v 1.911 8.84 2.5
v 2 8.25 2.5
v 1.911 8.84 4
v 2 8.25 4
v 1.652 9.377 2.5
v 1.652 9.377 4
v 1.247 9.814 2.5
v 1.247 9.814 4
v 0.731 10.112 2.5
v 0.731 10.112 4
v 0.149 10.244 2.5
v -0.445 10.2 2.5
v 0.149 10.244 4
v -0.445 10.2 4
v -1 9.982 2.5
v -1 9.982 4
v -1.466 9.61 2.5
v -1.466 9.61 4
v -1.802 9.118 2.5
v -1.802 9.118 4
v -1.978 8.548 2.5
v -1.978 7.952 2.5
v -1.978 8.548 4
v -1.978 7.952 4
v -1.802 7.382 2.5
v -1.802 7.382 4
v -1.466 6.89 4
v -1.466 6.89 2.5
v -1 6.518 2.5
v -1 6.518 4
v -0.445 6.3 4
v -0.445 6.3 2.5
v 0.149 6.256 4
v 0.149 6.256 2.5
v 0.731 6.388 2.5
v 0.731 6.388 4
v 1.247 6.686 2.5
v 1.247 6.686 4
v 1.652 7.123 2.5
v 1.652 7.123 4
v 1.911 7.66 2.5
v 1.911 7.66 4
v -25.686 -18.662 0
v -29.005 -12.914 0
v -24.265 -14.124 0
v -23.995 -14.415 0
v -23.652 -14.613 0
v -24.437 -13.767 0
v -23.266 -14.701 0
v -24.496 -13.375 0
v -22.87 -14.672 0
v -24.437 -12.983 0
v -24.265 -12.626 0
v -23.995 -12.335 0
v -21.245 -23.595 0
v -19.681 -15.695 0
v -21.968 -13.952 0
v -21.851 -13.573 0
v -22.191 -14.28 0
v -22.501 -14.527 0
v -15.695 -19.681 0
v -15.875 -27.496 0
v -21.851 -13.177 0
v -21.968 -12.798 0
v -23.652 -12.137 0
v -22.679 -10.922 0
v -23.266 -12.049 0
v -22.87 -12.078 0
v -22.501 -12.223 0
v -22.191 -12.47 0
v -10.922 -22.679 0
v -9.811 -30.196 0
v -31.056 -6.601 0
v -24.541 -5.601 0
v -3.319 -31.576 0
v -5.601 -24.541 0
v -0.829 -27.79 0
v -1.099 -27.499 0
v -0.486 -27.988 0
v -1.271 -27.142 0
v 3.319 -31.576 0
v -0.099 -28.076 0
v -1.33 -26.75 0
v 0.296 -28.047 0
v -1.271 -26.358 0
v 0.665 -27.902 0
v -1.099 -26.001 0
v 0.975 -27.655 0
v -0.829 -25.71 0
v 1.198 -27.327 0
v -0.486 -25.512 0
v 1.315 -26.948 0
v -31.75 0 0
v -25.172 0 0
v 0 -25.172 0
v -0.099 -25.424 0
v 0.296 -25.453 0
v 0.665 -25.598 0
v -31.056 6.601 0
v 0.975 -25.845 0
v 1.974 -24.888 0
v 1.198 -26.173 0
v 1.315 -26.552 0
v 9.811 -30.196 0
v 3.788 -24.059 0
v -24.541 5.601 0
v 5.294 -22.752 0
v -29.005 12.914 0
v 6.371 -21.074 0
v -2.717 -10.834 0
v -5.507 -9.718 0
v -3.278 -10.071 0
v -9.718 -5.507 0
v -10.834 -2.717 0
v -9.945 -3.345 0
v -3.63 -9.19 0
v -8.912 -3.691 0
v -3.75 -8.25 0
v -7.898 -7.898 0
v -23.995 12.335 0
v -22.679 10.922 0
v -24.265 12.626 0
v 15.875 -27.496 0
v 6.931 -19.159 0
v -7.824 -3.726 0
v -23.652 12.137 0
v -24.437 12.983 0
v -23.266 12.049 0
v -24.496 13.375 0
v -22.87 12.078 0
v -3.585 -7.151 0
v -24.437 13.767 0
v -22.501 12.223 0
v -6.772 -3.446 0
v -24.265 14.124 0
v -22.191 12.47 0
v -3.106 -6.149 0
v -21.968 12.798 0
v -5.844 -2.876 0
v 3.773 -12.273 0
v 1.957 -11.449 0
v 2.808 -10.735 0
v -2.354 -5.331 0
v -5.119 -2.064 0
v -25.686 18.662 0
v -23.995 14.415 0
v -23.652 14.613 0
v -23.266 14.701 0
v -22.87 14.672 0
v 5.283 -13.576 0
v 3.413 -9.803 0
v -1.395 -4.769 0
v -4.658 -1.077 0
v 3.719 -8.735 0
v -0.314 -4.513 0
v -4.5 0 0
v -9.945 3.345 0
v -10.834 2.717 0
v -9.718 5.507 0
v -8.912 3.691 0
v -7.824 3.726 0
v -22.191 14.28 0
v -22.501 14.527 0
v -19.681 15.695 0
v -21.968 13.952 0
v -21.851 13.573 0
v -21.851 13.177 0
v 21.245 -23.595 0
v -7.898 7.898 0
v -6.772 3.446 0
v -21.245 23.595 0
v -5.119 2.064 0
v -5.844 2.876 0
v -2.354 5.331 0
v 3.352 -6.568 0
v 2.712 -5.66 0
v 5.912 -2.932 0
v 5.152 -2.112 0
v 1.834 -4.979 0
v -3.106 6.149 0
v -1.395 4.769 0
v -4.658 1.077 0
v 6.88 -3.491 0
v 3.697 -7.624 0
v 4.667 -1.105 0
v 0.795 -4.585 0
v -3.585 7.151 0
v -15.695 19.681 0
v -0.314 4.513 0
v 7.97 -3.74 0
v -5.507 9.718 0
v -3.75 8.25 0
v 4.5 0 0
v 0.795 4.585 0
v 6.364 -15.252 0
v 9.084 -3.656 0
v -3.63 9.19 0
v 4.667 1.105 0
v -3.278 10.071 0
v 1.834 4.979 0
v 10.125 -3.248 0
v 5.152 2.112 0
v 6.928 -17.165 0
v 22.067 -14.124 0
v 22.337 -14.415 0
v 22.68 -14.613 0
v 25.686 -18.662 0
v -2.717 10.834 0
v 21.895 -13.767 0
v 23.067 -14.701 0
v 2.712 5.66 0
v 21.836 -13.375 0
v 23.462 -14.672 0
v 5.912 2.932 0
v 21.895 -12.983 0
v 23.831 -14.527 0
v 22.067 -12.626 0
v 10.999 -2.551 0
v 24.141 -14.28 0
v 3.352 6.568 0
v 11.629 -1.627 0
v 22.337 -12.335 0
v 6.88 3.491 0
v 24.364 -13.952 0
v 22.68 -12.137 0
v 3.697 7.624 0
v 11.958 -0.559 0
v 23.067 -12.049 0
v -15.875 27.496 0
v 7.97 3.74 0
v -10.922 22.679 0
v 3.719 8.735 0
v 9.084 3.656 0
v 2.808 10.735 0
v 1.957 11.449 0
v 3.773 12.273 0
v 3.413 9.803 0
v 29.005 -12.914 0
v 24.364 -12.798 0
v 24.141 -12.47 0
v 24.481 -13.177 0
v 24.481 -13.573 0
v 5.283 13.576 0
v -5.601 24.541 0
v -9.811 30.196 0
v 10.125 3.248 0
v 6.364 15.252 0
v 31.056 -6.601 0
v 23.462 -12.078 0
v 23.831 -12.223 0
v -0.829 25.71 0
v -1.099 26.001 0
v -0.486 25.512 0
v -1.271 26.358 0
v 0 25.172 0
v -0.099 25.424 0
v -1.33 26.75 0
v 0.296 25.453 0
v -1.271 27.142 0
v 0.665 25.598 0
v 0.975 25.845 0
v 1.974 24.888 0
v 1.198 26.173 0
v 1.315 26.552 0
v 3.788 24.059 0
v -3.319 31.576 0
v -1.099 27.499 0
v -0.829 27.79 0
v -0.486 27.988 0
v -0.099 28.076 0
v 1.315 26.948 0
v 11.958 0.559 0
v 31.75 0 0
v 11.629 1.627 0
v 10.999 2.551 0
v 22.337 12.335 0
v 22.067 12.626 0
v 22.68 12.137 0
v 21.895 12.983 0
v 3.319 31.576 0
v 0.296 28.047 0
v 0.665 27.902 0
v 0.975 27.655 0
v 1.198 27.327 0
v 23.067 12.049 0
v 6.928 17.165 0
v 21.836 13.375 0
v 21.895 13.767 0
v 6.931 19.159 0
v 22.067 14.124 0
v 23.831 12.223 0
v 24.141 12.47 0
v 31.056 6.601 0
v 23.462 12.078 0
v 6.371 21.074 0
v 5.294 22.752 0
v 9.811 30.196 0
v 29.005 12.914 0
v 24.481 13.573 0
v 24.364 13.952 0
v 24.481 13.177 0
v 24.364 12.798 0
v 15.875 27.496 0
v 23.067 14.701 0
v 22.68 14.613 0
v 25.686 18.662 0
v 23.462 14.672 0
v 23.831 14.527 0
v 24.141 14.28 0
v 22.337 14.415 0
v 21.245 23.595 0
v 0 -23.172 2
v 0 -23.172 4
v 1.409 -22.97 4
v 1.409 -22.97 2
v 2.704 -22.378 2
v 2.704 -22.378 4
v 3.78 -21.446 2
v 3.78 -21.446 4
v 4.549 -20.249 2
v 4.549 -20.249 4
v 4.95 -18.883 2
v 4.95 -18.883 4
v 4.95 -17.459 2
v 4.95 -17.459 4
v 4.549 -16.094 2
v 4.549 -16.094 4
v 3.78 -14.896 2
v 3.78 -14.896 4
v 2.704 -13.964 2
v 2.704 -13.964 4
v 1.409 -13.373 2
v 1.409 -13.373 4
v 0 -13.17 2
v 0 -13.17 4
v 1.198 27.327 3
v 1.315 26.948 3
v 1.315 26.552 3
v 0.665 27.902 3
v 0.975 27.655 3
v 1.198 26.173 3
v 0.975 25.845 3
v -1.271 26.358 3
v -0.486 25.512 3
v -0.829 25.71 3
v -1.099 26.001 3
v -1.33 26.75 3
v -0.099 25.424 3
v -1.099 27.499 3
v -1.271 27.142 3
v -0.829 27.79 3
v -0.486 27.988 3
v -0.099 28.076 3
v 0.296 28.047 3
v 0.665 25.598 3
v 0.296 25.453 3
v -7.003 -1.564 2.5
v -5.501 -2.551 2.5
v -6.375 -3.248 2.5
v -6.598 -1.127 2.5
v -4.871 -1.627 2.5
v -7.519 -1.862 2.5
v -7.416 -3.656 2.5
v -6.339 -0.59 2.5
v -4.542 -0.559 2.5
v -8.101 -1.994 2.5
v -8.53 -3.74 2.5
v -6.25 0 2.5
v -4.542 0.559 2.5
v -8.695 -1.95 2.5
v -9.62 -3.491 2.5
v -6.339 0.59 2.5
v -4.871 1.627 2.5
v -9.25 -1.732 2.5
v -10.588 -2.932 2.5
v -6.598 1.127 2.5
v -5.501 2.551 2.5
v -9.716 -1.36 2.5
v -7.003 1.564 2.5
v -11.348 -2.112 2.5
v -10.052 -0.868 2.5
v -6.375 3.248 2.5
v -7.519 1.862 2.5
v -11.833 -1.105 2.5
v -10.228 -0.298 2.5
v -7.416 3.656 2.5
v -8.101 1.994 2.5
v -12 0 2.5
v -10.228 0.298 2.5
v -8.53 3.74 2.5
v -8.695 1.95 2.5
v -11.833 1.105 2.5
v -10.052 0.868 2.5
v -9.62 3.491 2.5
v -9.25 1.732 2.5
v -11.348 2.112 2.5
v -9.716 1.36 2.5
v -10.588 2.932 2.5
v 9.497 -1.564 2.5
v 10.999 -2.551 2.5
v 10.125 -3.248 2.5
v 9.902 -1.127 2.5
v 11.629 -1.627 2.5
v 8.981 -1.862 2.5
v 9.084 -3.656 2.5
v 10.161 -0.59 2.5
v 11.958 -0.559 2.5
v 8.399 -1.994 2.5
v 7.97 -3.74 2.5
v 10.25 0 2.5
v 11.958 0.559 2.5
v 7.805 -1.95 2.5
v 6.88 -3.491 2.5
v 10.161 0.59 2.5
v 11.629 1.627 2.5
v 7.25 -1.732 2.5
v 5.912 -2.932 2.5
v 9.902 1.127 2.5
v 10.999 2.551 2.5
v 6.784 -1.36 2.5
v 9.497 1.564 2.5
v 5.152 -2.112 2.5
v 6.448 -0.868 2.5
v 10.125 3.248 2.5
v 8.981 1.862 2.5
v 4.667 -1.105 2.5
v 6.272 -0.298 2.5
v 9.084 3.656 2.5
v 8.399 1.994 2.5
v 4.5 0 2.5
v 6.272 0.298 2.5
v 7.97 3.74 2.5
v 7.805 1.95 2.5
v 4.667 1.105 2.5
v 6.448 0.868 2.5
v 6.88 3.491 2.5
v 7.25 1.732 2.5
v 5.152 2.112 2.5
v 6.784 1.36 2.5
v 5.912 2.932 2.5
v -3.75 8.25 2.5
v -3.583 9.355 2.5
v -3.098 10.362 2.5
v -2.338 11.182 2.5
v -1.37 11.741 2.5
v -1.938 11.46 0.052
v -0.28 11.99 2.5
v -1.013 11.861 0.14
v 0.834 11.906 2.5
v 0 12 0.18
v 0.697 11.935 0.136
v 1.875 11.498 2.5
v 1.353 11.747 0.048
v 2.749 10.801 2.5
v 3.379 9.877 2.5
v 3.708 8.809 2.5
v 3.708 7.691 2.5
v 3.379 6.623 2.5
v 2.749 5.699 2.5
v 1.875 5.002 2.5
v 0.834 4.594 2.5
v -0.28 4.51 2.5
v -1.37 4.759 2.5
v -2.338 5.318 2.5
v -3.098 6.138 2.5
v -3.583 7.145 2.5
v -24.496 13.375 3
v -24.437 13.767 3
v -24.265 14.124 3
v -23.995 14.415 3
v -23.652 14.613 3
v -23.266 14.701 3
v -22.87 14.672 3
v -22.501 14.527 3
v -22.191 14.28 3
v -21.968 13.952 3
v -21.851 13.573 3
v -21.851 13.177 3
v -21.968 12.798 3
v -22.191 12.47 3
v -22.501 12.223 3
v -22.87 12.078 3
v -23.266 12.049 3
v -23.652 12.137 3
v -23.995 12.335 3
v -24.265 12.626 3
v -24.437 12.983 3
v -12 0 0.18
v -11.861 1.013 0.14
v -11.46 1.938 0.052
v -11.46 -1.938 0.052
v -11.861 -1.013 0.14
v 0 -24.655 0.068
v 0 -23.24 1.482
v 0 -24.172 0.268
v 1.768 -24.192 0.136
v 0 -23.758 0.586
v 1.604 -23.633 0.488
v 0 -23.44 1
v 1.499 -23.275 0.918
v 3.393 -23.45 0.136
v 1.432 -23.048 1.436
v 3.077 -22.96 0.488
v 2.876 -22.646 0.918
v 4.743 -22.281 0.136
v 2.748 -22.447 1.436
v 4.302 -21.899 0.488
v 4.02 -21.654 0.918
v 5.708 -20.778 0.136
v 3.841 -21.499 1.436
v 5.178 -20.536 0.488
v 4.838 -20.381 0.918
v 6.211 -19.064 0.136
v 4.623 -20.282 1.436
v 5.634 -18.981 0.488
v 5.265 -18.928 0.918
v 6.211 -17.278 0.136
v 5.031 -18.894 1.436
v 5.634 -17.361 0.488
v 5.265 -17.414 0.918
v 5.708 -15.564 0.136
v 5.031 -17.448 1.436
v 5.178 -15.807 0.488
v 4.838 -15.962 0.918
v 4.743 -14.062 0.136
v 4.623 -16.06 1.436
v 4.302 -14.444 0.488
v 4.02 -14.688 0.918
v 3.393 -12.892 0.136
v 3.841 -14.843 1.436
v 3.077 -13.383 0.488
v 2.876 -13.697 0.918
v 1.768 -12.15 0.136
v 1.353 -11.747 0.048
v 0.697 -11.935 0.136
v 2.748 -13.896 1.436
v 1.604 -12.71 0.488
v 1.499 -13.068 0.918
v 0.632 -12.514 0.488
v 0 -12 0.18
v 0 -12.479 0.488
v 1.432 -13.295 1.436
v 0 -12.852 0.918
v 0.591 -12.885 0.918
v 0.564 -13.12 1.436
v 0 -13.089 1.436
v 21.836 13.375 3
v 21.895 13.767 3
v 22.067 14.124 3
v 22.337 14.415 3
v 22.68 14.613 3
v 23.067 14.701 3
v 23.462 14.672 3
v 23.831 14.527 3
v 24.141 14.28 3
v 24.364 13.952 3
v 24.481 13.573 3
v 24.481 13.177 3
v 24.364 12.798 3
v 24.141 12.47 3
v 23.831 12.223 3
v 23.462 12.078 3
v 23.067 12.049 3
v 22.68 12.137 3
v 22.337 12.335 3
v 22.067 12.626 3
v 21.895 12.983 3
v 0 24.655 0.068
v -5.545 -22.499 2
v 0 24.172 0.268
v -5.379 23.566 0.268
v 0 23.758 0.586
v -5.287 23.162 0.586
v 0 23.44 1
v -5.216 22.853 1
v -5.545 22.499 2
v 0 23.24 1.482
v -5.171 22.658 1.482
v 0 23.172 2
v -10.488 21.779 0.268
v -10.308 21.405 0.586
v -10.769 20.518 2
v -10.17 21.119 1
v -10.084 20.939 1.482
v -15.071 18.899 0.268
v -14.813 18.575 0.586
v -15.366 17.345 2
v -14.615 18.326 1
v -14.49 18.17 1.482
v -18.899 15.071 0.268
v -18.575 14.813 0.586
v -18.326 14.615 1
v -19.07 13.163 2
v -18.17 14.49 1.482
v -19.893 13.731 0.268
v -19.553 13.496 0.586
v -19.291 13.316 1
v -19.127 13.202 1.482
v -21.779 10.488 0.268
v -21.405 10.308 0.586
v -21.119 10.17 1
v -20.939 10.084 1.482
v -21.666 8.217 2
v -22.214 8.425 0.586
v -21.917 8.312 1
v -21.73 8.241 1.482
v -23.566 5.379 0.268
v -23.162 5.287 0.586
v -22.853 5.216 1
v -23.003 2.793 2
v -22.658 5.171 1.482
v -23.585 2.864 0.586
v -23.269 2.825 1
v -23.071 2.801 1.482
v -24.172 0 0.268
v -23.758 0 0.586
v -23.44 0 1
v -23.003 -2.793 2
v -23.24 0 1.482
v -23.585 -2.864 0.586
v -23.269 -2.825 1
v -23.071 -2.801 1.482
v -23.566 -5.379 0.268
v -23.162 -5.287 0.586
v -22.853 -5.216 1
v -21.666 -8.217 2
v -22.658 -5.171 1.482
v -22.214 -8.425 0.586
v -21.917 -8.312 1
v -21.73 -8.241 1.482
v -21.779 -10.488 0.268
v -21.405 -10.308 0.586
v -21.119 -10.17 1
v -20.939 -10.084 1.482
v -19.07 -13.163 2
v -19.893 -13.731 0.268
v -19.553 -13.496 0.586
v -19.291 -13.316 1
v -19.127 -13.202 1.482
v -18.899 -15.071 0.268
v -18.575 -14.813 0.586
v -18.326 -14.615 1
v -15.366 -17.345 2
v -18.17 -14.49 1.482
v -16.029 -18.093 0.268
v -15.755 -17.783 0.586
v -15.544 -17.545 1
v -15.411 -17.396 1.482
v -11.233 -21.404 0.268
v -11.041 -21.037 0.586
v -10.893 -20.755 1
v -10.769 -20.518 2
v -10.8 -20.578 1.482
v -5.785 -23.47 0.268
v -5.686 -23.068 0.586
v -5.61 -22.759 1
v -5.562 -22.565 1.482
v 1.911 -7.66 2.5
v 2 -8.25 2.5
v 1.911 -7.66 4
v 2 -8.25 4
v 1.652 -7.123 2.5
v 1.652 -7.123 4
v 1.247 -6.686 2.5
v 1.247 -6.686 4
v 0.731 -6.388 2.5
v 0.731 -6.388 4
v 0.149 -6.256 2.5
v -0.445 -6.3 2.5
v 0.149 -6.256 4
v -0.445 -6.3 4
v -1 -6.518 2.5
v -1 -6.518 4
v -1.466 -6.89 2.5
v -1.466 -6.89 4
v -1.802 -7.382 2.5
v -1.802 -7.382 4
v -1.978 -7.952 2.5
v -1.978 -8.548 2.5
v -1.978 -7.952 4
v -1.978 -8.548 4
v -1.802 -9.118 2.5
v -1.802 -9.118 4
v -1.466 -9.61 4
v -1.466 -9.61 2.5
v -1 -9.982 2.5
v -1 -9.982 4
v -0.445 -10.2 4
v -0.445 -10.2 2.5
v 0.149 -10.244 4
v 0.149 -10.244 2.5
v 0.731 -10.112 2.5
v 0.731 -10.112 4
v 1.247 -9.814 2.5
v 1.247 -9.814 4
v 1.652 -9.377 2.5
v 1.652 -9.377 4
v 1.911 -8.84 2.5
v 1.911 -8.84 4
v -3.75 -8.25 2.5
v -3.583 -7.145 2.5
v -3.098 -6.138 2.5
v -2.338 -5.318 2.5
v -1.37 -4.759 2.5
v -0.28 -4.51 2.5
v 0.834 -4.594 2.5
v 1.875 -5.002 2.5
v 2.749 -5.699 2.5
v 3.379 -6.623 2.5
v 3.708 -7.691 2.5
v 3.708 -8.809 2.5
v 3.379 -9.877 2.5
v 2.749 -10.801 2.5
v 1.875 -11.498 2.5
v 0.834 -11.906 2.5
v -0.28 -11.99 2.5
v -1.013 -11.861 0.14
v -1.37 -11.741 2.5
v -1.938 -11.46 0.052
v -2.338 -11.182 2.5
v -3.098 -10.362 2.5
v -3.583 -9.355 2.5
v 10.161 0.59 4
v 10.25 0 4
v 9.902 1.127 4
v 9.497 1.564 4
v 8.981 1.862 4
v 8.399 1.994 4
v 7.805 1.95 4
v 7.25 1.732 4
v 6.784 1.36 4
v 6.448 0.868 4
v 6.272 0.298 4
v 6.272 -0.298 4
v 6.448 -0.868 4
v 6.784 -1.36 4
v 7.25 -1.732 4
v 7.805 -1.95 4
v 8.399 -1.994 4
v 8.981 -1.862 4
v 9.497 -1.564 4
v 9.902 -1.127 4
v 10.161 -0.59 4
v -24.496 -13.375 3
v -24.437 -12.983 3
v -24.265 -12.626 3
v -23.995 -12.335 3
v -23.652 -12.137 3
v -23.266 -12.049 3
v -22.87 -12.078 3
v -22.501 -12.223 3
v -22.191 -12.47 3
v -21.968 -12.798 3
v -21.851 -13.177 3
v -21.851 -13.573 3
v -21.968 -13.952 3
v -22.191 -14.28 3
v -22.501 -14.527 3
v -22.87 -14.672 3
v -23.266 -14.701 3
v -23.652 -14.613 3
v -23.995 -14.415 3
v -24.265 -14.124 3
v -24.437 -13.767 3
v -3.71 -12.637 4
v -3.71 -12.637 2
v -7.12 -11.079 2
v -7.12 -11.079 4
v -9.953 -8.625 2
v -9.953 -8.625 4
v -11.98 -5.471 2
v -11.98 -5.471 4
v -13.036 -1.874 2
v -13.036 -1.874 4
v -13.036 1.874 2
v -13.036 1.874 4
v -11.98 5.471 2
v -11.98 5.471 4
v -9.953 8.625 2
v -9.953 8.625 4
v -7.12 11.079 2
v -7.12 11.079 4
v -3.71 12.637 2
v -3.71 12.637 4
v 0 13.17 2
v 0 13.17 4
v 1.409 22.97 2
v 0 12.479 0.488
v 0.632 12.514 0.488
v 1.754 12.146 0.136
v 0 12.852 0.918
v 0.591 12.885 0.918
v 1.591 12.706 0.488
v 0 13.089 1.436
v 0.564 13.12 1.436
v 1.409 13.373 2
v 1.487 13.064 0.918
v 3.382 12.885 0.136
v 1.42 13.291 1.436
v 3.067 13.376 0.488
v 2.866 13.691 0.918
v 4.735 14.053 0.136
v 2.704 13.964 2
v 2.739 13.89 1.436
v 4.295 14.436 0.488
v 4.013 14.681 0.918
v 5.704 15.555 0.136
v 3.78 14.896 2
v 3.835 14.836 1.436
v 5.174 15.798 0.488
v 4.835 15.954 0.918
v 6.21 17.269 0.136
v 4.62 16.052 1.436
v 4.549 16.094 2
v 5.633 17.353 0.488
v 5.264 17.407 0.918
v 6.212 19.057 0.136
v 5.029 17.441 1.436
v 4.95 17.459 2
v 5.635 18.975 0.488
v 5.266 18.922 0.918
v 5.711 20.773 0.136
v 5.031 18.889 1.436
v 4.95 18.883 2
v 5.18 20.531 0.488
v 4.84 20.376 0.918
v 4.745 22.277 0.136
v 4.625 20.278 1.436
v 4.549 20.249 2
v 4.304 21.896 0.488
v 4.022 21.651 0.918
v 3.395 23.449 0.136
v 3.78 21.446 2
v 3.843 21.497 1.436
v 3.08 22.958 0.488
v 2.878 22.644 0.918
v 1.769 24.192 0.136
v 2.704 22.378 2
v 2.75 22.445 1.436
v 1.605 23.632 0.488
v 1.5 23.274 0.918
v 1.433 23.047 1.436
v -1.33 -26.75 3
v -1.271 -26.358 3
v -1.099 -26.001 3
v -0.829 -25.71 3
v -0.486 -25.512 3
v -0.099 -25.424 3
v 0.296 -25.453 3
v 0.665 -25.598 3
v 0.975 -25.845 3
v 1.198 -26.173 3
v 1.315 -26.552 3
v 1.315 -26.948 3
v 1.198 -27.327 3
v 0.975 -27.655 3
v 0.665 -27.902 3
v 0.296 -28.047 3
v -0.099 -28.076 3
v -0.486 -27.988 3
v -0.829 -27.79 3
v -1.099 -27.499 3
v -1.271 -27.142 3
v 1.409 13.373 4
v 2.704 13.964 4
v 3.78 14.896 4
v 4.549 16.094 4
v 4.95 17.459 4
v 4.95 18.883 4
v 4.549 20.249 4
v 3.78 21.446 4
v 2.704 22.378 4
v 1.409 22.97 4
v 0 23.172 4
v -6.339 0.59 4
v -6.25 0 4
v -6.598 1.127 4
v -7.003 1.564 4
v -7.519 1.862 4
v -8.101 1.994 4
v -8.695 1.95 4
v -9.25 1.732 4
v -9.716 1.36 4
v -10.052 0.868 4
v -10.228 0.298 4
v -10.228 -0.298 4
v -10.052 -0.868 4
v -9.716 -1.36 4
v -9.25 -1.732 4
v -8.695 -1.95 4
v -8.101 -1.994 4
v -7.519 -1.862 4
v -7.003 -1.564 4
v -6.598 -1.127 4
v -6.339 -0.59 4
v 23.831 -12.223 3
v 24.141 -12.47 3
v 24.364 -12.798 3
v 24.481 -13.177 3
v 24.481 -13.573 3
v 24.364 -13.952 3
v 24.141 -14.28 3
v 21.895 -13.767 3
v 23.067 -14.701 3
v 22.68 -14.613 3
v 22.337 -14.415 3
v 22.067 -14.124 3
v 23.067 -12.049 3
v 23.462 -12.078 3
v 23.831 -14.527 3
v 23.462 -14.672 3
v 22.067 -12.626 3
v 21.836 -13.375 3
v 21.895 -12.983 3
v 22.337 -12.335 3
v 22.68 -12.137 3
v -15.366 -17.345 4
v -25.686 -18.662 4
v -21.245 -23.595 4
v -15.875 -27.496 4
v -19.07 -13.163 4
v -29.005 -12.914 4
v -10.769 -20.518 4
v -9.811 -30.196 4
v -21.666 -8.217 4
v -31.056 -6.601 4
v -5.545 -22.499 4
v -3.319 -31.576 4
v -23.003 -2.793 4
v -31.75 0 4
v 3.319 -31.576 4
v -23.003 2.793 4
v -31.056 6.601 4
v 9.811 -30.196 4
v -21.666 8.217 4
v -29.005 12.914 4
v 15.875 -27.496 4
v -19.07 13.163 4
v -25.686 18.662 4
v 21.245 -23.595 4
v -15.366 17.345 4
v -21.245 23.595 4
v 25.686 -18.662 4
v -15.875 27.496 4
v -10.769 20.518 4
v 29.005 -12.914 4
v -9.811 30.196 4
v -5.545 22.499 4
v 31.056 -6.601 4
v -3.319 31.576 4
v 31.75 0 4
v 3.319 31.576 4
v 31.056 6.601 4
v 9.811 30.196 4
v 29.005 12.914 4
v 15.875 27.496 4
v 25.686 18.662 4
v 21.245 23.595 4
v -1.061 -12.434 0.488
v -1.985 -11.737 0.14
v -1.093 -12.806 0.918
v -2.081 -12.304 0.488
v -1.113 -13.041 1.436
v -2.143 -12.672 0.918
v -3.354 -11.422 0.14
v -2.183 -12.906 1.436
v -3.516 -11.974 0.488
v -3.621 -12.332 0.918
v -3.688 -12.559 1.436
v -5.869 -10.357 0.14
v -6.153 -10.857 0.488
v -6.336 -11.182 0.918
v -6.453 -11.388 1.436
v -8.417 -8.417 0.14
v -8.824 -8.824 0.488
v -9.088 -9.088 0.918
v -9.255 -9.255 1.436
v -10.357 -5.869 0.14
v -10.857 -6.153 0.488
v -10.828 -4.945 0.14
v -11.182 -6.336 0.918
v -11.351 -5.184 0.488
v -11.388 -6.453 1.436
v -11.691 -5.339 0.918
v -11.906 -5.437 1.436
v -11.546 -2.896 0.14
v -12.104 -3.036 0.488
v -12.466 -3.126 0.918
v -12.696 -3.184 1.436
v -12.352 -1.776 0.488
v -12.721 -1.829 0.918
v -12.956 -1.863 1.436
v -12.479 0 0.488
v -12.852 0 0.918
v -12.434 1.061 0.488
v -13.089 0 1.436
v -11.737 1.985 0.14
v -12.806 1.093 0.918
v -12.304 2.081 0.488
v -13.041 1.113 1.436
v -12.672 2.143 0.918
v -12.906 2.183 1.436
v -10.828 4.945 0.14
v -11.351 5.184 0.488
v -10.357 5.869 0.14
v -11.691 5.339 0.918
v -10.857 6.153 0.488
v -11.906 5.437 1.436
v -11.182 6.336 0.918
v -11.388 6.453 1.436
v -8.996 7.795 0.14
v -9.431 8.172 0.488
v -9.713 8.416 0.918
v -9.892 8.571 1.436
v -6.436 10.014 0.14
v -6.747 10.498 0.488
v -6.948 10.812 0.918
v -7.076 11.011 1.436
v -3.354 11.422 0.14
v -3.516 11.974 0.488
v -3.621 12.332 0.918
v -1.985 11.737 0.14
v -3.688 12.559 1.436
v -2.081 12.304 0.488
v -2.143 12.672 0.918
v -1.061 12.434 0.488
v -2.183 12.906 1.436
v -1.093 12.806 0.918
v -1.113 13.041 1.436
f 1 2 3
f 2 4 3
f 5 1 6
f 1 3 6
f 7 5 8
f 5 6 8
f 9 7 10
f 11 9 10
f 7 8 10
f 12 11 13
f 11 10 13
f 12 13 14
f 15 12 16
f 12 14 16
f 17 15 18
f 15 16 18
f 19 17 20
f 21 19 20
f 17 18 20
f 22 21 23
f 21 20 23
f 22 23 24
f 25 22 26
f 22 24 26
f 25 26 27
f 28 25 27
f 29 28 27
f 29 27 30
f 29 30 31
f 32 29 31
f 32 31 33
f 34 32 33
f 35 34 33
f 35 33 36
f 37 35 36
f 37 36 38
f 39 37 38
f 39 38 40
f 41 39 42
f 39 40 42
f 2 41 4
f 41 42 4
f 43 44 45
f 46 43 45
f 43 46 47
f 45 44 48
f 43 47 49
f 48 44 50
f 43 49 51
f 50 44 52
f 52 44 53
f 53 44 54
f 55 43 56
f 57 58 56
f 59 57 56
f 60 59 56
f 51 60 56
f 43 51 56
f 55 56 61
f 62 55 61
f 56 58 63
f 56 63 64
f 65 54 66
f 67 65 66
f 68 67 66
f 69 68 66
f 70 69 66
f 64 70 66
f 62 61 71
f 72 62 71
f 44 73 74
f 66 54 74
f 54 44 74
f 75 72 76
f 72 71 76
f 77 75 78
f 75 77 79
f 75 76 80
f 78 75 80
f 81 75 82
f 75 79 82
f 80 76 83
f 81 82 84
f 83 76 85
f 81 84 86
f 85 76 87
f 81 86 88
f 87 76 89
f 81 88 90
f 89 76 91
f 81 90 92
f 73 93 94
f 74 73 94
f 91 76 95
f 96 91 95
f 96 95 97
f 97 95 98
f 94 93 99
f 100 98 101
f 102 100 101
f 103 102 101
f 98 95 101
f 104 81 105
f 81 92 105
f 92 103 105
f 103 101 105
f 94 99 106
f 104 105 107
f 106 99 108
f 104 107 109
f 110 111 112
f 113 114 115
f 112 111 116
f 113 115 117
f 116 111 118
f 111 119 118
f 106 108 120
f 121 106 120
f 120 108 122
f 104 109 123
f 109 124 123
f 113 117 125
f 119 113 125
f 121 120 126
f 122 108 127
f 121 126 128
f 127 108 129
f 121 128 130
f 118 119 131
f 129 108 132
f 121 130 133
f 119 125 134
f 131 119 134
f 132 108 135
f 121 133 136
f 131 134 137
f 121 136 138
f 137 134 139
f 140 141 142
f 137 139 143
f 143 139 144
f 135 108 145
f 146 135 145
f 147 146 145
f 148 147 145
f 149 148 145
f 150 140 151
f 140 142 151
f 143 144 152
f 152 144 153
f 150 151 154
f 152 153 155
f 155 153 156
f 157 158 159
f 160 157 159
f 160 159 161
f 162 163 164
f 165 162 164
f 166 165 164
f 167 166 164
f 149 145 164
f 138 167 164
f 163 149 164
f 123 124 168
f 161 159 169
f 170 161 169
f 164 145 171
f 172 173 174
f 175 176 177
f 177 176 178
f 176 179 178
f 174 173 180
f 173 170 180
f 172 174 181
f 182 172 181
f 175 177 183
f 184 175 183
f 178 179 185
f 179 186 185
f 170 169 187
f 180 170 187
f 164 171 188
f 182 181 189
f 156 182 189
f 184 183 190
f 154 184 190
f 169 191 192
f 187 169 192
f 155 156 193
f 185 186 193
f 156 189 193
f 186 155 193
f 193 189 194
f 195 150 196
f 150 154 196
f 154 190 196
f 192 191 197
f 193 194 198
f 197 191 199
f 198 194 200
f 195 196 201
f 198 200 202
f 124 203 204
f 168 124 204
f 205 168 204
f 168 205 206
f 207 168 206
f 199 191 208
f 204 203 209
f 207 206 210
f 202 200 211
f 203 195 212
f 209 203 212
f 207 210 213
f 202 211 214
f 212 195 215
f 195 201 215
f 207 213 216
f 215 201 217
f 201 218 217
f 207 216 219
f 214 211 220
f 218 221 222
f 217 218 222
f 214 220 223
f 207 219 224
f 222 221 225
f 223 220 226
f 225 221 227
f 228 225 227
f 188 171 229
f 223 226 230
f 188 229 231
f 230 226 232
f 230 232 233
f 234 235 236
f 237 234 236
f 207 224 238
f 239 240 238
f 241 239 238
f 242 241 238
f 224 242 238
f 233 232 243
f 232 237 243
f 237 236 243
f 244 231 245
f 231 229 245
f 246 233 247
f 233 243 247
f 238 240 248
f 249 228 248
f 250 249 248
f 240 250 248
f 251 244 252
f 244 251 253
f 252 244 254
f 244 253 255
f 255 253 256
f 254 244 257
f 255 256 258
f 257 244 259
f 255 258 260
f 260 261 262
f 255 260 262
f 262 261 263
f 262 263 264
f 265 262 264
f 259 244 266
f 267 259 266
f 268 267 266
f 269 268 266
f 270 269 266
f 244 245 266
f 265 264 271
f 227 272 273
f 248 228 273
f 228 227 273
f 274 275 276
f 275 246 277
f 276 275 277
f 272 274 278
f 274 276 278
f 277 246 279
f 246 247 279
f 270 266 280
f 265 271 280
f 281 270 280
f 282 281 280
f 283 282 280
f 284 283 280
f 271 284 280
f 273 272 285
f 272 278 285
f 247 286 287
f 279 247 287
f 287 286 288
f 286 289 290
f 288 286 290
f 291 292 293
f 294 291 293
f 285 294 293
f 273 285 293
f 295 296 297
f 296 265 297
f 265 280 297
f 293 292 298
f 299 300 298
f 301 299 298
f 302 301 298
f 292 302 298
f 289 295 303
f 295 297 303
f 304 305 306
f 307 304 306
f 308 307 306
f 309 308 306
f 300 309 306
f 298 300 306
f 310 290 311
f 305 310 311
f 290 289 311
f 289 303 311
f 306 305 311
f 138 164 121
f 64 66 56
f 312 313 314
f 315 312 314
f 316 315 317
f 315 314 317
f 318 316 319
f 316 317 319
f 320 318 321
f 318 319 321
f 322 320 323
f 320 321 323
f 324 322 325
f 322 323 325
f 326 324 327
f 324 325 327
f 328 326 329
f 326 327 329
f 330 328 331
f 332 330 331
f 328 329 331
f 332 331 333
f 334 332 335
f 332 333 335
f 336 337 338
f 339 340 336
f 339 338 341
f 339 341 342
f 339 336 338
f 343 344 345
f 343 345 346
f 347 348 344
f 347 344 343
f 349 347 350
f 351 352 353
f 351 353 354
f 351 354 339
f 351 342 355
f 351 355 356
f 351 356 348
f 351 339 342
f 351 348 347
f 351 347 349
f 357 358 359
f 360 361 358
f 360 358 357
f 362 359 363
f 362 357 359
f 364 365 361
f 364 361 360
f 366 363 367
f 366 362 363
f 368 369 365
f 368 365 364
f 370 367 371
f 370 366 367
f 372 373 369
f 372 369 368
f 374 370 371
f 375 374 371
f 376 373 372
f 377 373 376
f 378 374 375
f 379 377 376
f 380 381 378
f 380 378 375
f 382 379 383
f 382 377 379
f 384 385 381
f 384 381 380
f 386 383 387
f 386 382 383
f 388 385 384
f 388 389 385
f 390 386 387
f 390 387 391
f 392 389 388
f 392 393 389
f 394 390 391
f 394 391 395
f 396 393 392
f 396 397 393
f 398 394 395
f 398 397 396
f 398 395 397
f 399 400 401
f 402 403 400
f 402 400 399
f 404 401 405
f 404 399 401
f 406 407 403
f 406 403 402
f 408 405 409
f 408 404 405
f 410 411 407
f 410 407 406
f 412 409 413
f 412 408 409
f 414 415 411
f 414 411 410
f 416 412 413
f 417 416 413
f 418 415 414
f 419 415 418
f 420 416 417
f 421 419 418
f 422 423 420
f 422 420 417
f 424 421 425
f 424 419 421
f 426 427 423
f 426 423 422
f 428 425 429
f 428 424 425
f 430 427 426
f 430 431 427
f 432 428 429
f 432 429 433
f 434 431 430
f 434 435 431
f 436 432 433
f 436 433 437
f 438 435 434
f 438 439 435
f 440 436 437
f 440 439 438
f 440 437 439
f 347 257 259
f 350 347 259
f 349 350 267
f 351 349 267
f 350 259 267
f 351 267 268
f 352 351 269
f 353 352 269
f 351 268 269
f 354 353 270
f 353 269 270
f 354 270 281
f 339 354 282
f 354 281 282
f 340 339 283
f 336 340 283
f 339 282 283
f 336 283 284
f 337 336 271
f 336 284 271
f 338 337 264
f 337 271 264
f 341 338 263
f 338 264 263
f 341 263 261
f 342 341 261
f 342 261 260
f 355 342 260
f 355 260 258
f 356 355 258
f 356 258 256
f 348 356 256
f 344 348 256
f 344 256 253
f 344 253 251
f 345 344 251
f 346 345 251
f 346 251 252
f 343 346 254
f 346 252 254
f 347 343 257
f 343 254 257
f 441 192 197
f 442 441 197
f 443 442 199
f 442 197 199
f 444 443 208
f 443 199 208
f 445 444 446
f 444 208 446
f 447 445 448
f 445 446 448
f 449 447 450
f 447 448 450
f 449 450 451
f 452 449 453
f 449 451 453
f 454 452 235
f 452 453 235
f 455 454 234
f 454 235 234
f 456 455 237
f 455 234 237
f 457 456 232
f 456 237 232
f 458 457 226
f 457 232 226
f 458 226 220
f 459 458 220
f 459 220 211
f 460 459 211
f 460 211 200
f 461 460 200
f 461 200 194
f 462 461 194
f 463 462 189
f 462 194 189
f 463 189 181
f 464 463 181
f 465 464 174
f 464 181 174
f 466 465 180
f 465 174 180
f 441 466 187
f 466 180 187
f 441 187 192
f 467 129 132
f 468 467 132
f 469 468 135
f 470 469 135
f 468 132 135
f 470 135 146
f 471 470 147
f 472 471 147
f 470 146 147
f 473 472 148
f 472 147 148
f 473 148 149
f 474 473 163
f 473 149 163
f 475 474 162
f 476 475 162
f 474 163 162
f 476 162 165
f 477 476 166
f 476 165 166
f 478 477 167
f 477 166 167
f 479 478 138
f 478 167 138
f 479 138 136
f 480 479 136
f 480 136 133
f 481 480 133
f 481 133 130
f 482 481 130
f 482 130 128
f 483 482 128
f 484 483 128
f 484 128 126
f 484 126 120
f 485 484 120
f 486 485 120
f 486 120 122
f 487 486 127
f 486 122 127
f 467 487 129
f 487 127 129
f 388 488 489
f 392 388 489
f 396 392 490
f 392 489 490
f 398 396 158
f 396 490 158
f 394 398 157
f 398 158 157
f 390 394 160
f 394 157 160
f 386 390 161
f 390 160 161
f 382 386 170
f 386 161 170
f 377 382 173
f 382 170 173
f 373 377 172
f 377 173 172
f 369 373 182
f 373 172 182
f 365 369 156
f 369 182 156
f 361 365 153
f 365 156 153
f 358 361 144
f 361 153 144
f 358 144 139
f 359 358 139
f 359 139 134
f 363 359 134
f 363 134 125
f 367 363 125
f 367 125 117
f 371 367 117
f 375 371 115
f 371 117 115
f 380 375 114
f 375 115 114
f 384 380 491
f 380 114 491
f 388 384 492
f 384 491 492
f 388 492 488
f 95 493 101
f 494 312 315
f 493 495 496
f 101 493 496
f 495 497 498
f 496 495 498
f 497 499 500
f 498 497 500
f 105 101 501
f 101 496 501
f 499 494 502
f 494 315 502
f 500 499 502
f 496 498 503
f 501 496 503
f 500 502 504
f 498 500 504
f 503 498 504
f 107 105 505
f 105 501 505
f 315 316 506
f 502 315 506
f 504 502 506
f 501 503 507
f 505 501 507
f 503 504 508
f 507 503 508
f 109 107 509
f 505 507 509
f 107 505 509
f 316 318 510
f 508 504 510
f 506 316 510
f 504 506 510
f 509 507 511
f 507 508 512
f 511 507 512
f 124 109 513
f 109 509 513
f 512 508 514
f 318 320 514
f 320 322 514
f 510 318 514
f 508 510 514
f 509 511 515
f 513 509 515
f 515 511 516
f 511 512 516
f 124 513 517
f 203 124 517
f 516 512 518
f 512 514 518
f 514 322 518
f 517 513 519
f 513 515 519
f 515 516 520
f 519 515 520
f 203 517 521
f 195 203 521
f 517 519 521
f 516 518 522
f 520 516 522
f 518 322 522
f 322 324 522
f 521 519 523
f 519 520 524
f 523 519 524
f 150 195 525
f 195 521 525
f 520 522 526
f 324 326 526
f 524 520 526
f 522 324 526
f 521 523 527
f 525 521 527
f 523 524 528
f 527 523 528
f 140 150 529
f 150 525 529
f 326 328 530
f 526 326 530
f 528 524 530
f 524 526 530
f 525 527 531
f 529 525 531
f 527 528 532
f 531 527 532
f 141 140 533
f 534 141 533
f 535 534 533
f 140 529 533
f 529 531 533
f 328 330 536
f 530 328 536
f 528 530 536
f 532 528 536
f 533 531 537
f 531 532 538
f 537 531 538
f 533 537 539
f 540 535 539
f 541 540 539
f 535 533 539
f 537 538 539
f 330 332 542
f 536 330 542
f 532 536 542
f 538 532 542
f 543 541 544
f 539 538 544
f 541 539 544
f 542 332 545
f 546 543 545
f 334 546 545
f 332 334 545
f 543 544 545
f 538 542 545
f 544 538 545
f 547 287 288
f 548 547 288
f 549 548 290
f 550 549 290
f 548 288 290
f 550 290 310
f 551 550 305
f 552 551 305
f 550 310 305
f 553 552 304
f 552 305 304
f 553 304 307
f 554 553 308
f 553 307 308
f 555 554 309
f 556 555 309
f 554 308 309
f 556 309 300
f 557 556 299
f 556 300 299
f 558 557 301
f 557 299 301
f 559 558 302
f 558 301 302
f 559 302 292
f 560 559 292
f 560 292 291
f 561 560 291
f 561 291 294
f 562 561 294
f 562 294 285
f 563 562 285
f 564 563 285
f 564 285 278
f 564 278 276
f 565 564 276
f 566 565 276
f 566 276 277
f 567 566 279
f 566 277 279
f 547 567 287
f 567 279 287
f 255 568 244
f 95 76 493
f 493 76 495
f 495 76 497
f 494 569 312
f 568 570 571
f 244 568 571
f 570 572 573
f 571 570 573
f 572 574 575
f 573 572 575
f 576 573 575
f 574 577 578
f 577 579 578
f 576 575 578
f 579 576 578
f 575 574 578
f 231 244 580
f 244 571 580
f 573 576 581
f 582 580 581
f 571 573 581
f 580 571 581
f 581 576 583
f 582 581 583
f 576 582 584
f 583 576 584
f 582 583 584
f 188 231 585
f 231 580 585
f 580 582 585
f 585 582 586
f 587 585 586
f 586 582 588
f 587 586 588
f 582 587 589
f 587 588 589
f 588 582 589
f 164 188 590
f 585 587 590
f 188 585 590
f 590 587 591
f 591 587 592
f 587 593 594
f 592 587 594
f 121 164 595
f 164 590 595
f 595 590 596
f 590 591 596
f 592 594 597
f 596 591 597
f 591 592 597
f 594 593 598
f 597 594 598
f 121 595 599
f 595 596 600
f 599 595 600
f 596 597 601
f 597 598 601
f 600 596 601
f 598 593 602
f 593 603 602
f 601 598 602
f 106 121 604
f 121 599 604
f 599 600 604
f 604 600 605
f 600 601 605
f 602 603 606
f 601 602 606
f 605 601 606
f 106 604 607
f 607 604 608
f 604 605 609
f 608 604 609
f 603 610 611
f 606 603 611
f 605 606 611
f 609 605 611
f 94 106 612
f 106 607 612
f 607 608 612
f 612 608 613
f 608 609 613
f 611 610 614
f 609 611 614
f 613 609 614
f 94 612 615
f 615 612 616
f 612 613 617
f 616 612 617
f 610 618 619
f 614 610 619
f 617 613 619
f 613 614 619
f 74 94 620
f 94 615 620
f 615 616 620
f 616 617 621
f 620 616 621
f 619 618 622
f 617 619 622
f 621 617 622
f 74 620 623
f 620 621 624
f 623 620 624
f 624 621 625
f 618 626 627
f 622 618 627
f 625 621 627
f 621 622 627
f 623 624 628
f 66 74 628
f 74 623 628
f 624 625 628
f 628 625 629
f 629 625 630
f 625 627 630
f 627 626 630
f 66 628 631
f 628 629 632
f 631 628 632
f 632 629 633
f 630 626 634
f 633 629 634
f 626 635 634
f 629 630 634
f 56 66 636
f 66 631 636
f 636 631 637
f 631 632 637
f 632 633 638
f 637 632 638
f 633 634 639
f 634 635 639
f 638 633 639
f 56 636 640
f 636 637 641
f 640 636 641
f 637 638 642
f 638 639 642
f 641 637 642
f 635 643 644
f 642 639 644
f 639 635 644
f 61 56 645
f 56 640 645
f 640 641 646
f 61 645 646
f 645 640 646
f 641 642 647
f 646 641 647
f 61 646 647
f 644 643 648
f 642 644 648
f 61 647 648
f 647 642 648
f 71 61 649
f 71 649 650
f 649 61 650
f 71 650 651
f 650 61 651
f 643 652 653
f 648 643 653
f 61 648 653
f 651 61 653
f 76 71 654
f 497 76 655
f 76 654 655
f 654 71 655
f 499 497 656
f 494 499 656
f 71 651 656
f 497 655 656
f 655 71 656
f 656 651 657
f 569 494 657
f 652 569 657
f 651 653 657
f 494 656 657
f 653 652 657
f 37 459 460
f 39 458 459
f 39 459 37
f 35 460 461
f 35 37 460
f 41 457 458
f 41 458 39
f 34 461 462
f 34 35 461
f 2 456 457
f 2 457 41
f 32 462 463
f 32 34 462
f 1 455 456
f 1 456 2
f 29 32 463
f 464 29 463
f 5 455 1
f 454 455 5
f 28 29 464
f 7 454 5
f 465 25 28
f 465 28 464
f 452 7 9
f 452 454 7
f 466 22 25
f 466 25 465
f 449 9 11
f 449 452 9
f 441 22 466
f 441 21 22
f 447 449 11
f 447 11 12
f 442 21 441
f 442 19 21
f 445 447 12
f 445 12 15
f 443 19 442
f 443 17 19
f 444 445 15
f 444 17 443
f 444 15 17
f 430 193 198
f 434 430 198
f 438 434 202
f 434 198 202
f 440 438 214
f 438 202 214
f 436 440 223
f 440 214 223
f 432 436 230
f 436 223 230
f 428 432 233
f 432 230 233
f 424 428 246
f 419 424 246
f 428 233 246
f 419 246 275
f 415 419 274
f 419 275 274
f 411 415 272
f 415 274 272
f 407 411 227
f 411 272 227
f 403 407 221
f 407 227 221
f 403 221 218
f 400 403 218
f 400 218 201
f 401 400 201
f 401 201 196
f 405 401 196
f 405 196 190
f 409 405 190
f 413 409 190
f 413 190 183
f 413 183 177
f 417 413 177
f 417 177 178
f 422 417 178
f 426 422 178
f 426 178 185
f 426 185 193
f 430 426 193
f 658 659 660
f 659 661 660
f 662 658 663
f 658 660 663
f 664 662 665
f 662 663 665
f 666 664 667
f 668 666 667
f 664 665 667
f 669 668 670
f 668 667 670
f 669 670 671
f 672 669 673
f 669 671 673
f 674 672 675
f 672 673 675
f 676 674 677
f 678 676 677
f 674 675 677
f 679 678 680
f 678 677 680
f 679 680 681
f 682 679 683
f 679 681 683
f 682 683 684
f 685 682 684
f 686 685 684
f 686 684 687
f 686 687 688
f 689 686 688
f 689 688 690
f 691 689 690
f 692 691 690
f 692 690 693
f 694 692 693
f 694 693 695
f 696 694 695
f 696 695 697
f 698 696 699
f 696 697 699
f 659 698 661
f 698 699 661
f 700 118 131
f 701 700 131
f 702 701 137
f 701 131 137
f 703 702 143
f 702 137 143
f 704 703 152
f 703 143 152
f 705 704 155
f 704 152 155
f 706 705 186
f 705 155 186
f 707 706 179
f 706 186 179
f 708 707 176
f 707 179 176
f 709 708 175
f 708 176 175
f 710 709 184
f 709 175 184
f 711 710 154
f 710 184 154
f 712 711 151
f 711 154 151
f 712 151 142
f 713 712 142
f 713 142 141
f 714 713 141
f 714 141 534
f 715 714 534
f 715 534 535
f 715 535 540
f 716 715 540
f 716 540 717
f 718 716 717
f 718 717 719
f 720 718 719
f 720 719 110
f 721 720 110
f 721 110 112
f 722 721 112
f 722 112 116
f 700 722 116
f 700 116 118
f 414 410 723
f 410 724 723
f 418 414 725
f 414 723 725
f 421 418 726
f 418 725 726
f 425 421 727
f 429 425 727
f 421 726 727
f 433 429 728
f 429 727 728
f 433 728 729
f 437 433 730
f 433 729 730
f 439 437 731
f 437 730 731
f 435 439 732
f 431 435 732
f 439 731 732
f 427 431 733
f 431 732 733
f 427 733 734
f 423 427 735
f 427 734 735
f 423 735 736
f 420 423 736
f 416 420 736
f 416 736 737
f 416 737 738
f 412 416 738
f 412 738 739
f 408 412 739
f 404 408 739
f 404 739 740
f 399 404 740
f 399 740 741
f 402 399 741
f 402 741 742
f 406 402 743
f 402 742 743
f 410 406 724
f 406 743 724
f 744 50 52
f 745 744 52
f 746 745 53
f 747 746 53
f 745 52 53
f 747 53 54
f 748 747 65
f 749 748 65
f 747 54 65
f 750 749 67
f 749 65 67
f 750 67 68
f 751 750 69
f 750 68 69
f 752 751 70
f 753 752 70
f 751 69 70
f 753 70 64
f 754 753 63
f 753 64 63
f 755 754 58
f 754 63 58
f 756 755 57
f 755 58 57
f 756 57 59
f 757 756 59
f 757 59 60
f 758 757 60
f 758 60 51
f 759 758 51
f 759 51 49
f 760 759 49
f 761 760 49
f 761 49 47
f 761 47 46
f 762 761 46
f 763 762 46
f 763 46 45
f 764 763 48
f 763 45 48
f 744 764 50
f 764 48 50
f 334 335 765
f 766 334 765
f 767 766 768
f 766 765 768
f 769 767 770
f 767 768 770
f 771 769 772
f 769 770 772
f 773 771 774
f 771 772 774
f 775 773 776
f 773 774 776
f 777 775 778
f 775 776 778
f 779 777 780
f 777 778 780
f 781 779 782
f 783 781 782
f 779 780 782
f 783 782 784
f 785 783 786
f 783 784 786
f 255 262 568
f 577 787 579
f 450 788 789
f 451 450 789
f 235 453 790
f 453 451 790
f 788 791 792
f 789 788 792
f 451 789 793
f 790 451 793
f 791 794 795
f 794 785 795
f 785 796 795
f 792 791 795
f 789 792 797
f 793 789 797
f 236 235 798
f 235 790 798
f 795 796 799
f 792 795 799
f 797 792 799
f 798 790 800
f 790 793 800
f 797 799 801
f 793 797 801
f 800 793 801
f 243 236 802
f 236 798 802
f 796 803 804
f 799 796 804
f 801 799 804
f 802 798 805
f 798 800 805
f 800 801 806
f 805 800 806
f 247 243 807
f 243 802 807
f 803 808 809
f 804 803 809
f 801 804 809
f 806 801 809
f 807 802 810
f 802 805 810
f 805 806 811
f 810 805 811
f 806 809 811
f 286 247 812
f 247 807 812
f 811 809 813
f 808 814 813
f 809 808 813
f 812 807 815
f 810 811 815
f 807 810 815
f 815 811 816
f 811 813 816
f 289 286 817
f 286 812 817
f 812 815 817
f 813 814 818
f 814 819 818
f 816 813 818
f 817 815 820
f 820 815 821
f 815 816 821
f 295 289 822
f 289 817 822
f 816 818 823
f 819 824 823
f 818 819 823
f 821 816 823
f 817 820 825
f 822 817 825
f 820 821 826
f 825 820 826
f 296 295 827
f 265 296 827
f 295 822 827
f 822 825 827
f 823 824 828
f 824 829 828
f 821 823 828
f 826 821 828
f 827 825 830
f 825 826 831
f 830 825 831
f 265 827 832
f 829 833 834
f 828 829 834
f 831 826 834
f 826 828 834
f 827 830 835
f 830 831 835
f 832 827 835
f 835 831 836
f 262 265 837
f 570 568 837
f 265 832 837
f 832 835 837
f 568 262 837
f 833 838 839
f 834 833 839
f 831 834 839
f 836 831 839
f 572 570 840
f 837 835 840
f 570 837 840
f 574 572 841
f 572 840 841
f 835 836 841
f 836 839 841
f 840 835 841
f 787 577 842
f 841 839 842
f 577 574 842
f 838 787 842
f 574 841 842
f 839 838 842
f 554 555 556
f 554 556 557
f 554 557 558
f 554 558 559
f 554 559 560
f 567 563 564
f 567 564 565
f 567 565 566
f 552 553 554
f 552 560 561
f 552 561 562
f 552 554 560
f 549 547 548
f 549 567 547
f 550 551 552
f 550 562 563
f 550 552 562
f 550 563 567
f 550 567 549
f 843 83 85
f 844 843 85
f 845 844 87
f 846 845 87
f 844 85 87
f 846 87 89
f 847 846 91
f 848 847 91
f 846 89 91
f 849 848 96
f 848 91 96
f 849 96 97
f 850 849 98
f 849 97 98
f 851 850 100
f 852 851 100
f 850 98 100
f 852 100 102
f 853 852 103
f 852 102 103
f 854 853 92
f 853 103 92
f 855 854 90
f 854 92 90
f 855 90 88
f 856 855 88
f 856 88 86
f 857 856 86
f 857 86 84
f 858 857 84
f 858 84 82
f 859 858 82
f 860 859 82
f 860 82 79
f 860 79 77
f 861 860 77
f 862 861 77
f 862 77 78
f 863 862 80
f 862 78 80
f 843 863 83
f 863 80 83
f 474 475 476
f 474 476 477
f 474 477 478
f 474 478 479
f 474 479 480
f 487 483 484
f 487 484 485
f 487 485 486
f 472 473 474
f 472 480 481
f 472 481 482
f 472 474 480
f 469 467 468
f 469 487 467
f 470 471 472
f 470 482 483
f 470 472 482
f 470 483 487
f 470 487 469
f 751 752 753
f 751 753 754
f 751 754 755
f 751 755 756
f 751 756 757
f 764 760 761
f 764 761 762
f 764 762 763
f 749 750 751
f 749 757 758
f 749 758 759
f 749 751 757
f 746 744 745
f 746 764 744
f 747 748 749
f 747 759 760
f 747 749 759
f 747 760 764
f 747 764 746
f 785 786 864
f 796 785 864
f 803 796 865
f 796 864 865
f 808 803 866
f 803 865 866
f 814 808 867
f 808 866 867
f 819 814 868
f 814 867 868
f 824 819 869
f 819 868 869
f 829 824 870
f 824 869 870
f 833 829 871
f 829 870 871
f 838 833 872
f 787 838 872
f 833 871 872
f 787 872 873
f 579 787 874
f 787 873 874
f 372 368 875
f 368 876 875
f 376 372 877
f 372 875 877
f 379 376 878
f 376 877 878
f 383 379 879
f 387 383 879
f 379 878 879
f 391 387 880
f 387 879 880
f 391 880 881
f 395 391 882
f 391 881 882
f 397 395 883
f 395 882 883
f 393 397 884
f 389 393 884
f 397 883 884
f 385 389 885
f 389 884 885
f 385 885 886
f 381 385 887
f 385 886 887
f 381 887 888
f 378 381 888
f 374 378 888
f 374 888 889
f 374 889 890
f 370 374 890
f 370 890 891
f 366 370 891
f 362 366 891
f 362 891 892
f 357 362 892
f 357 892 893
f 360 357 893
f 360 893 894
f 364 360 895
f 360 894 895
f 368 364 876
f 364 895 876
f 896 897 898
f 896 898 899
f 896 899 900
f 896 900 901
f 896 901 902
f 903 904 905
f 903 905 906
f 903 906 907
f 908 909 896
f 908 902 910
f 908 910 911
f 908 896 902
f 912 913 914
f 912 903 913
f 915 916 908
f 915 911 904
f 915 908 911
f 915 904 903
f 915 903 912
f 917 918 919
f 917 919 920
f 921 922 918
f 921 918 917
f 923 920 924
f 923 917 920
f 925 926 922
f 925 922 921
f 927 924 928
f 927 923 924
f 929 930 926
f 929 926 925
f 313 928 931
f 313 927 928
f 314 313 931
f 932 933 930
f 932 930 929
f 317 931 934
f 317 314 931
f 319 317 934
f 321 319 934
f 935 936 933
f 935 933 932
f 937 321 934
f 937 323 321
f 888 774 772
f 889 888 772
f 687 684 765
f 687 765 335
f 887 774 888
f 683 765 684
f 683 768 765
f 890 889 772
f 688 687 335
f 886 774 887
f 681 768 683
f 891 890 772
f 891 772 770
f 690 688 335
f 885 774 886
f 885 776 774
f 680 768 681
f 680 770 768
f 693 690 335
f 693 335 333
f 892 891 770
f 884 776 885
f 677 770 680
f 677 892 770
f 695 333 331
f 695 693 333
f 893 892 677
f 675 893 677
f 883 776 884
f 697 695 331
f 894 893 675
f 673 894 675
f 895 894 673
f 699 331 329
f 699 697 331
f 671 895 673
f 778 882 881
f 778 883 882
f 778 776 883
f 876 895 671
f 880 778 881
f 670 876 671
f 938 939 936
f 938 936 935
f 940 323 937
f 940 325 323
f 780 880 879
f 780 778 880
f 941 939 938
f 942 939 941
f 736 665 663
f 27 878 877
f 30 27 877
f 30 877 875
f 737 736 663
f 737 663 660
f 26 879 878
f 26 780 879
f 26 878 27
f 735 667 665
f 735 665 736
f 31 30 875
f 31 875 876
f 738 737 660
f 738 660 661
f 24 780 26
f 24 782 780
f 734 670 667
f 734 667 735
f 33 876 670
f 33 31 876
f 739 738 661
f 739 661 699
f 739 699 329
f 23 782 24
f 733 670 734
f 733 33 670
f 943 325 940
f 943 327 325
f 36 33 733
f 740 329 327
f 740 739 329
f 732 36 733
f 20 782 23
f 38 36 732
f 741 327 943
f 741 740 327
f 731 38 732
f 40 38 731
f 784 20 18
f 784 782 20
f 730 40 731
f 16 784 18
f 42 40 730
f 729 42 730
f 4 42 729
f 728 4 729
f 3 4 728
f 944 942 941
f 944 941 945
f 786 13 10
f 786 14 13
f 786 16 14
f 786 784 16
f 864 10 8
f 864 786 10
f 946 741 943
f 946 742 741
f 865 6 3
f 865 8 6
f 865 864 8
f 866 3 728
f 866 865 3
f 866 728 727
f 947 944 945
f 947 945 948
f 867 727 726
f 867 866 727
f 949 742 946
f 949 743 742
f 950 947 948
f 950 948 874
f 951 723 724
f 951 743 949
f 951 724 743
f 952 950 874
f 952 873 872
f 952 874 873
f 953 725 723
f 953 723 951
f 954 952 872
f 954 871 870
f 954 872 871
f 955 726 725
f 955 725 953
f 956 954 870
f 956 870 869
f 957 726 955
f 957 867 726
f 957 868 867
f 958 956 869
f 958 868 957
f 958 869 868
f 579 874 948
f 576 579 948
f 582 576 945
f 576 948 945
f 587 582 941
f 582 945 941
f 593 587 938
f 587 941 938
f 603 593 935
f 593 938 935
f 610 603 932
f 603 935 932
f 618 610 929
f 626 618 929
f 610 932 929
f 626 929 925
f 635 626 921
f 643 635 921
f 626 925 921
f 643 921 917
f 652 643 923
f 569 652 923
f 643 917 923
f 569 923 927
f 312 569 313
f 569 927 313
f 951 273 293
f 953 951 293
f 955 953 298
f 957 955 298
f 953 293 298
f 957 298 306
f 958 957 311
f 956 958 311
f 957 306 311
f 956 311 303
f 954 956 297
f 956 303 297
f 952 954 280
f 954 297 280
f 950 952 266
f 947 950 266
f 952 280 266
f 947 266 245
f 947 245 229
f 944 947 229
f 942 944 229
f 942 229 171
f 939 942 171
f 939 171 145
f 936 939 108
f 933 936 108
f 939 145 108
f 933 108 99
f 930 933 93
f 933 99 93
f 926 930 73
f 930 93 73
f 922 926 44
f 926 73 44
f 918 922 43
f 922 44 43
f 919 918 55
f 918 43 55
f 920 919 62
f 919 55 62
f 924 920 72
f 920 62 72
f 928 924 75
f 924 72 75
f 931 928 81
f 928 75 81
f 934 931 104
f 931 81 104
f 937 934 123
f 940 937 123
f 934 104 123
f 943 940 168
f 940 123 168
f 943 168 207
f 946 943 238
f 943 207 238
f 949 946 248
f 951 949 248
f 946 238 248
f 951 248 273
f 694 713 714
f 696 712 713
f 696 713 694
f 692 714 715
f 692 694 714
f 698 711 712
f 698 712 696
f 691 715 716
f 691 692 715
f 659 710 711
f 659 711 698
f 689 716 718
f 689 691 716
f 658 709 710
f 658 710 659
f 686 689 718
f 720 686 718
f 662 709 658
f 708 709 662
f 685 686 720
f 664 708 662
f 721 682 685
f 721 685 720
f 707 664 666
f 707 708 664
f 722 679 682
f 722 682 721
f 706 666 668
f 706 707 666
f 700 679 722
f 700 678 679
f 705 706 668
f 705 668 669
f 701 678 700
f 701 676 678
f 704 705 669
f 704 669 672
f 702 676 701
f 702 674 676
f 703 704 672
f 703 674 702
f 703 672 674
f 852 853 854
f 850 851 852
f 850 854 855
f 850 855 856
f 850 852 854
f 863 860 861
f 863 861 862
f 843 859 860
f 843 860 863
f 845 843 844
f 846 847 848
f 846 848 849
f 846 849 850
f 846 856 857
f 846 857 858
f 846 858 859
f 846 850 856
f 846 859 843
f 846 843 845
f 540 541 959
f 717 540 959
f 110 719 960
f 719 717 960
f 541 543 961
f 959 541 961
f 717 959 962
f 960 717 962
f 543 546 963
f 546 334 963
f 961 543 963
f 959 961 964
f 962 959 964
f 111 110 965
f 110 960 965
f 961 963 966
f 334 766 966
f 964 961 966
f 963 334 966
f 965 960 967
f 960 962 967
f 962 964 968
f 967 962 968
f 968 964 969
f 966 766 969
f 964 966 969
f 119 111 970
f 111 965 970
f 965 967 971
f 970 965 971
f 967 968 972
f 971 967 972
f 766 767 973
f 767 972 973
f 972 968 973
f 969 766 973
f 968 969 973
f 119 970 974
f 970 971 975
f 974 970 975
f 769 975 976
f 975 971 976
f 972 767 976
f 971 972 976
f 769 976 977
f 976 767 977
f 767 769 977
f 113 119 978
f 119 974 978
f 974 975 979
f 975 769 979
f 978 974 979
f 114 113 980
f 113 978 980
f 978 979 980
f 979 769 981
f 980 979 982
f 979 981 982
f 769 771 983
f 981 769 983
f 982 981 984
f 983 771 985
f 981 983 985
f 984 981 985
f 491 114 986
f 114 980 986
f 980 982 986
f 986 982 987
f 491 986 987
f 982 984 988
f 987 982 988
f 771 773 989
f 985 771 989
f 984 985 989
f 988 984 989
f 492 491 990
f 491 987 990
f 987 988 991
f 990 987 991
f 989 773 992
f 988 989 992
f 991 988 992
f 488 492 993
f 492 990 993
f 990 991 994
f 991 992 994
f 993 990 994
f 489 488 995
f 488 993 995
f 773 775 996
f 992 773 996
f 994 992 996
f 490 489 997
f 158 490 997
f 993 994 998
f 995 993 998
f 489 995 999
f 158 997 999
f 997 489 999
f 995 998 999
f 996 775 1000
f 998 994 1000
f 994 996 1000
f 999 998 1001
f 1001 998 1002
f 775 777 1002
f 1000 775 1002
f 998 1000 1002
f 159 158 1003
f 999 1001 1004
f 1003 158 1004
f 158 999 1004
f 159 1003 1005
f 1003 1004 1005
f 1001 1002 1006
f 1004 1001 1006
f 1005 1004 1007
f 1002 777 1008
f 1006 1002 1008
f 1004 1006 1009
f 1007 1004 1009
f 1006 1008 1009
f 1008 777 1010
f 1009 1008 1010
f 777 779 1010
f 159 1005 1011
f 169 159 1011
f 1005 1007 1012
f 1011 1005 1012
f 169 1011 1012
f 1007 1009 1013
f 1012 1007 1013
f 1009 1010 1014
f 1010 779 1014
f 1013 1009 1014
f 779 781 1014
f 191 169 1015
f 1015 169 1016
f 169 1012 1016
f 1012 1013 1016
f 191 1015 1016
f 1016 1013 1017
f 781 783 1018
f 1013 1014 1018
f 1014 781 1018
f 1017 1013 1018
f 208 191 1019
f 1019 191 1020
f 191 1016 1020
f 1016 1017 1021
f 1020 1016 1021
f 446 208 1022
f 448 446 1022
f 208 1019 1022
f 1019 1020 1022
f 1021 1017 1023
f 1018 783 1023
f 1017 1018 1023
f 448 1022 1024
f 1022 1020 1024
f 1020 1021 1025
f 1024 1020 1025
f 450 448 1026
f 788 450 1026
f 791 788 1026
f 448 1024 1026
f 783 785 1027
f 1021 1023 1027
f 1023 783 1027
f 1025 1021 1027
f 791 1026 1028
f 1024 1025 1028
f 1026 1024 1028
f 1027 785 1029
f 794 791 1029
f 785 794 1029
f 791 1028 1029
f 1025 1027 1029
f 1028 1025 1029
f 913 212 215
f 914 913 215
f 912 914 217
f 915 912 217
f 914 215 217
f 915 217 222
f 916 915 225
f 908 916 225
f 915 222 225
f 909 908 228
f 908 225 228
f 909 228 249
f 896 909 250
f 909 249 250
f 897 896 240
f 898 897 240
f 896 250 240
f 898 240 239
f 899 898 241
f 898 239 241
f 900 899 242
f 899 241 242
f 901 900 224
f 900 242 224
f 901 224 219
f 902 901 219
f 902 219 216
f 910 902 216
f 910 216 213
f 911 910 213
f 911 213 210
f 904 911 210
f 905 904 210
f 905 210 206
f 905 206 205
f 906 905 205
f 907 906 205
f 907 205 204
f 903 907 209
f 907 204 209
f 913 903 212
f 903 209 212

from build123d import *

# Parameters (mm, degrees)
SKETCH1_R                               = 31.75
ELBOW_PLATE_DEPTH                       = 4
SKETCH3_R                               = 1.33
SCREW_HOLES_DEPTH                       = 3
CABLE_SLOT_DEPTH                        = 4
FILLET1_R                               = 2
CBORE_FOR_M6_HEX_HEAD_BOLT1_D           = 4
CBORE_FOR_M6_HEX_HEAD_BOLT1_CBORE_D     = 7.5
CBORE_FOR_M6_HEX_HEAD_BOLT1_CBORE_DEPTH = 2.5


with BuildPart() as part:
    # Sketch1 → Elbow Plate (new body)
    with BuildSketch(Plane.XY):
        Circle(SKETCH1_R)
    extrude(amount=ELBOW_PLATE_DEPTH)

    # Sketch3 → Screw Holes (cut)
    with BuildSketch(Plane(origin=(0, 0, 0), x_dir=(-1, 0, 0), z_dir=(0, 0, -1))):
        with Locations((0, 26.75)):
            Circle(SKETCH3_R)
        with Locations((23.166179551, 13.375)):
            Circle(SKETCH3_R)
        with Locations((23.166179551, -13.375)):
            Circle(SKETCH3_R)
        with Locations((0, -26.75)):
            Circle(SKETCH3_R)
        with Locations((-23.166179551, -13.375)):
            Circle(SKETCH3_R)
        with Locations((-23.166179551, 13.375)):
            Circle(SKETCH3_R)
    extrude(amount=-SCREW_HOLES_DEPTH, mode=Mode.SUBTRACT)

    # Sketch4 → Cable Slot (cut)
    with BuildSketch(Plane.XY.offset(4)):
        with BuildLine():
            ThreePointArc((0, -23.172318516), (5.001159258, -18.171159258), (0, -13.17))
            ThreePointArc((0, -13.17), (-13.17, 0), (0, 13.17))
            ThreePointArc((0, 13.17), (5.001159258, 18.171159258), (0, 23.172318516))
            ThreePointArc((0, 23.172318516), (-23.172318516, 0), (0, -23.172318516))
        make_face()
    extrude(amount=-CABLE_SLOT_DEPTH, mode=Mode.SUBTRACT)

    # Fillet1
    fillet1_edges = [part.edges().sort_by_distance(p)[0] for p in [
        (-23.172318516, 0, 0),
        (5.001159258, 18.171159258, 0),
        (-13.17, 0, 0),
        (5.001159258, -18.171159258, 0),
    ]]
    fillet(fillet1_edges, radius=FILLET1_R)

    # CBORE for M6 Hex Head Bolt1 (through all)
    with Locations(Plane(origin=(0, 0, 0), x_dir=(-1, 0, 0), z_dir=(0, 0, -1))):
        with Locations((-8.25, 0), (0, -8.25), (8.25, 0), (0, 8.25)):
            CounterBoreHole(CBORE_FOR_M6_HEX_HEAD_BOLT1_D / 2, CBORE_FOR_M6_HEX_HEAD_BOLT1_CBORE_D / 2, CBORE_FOR_M6_HEX_HEAD_BOLT1_CBORE_DEPTH)


solid = part.part
